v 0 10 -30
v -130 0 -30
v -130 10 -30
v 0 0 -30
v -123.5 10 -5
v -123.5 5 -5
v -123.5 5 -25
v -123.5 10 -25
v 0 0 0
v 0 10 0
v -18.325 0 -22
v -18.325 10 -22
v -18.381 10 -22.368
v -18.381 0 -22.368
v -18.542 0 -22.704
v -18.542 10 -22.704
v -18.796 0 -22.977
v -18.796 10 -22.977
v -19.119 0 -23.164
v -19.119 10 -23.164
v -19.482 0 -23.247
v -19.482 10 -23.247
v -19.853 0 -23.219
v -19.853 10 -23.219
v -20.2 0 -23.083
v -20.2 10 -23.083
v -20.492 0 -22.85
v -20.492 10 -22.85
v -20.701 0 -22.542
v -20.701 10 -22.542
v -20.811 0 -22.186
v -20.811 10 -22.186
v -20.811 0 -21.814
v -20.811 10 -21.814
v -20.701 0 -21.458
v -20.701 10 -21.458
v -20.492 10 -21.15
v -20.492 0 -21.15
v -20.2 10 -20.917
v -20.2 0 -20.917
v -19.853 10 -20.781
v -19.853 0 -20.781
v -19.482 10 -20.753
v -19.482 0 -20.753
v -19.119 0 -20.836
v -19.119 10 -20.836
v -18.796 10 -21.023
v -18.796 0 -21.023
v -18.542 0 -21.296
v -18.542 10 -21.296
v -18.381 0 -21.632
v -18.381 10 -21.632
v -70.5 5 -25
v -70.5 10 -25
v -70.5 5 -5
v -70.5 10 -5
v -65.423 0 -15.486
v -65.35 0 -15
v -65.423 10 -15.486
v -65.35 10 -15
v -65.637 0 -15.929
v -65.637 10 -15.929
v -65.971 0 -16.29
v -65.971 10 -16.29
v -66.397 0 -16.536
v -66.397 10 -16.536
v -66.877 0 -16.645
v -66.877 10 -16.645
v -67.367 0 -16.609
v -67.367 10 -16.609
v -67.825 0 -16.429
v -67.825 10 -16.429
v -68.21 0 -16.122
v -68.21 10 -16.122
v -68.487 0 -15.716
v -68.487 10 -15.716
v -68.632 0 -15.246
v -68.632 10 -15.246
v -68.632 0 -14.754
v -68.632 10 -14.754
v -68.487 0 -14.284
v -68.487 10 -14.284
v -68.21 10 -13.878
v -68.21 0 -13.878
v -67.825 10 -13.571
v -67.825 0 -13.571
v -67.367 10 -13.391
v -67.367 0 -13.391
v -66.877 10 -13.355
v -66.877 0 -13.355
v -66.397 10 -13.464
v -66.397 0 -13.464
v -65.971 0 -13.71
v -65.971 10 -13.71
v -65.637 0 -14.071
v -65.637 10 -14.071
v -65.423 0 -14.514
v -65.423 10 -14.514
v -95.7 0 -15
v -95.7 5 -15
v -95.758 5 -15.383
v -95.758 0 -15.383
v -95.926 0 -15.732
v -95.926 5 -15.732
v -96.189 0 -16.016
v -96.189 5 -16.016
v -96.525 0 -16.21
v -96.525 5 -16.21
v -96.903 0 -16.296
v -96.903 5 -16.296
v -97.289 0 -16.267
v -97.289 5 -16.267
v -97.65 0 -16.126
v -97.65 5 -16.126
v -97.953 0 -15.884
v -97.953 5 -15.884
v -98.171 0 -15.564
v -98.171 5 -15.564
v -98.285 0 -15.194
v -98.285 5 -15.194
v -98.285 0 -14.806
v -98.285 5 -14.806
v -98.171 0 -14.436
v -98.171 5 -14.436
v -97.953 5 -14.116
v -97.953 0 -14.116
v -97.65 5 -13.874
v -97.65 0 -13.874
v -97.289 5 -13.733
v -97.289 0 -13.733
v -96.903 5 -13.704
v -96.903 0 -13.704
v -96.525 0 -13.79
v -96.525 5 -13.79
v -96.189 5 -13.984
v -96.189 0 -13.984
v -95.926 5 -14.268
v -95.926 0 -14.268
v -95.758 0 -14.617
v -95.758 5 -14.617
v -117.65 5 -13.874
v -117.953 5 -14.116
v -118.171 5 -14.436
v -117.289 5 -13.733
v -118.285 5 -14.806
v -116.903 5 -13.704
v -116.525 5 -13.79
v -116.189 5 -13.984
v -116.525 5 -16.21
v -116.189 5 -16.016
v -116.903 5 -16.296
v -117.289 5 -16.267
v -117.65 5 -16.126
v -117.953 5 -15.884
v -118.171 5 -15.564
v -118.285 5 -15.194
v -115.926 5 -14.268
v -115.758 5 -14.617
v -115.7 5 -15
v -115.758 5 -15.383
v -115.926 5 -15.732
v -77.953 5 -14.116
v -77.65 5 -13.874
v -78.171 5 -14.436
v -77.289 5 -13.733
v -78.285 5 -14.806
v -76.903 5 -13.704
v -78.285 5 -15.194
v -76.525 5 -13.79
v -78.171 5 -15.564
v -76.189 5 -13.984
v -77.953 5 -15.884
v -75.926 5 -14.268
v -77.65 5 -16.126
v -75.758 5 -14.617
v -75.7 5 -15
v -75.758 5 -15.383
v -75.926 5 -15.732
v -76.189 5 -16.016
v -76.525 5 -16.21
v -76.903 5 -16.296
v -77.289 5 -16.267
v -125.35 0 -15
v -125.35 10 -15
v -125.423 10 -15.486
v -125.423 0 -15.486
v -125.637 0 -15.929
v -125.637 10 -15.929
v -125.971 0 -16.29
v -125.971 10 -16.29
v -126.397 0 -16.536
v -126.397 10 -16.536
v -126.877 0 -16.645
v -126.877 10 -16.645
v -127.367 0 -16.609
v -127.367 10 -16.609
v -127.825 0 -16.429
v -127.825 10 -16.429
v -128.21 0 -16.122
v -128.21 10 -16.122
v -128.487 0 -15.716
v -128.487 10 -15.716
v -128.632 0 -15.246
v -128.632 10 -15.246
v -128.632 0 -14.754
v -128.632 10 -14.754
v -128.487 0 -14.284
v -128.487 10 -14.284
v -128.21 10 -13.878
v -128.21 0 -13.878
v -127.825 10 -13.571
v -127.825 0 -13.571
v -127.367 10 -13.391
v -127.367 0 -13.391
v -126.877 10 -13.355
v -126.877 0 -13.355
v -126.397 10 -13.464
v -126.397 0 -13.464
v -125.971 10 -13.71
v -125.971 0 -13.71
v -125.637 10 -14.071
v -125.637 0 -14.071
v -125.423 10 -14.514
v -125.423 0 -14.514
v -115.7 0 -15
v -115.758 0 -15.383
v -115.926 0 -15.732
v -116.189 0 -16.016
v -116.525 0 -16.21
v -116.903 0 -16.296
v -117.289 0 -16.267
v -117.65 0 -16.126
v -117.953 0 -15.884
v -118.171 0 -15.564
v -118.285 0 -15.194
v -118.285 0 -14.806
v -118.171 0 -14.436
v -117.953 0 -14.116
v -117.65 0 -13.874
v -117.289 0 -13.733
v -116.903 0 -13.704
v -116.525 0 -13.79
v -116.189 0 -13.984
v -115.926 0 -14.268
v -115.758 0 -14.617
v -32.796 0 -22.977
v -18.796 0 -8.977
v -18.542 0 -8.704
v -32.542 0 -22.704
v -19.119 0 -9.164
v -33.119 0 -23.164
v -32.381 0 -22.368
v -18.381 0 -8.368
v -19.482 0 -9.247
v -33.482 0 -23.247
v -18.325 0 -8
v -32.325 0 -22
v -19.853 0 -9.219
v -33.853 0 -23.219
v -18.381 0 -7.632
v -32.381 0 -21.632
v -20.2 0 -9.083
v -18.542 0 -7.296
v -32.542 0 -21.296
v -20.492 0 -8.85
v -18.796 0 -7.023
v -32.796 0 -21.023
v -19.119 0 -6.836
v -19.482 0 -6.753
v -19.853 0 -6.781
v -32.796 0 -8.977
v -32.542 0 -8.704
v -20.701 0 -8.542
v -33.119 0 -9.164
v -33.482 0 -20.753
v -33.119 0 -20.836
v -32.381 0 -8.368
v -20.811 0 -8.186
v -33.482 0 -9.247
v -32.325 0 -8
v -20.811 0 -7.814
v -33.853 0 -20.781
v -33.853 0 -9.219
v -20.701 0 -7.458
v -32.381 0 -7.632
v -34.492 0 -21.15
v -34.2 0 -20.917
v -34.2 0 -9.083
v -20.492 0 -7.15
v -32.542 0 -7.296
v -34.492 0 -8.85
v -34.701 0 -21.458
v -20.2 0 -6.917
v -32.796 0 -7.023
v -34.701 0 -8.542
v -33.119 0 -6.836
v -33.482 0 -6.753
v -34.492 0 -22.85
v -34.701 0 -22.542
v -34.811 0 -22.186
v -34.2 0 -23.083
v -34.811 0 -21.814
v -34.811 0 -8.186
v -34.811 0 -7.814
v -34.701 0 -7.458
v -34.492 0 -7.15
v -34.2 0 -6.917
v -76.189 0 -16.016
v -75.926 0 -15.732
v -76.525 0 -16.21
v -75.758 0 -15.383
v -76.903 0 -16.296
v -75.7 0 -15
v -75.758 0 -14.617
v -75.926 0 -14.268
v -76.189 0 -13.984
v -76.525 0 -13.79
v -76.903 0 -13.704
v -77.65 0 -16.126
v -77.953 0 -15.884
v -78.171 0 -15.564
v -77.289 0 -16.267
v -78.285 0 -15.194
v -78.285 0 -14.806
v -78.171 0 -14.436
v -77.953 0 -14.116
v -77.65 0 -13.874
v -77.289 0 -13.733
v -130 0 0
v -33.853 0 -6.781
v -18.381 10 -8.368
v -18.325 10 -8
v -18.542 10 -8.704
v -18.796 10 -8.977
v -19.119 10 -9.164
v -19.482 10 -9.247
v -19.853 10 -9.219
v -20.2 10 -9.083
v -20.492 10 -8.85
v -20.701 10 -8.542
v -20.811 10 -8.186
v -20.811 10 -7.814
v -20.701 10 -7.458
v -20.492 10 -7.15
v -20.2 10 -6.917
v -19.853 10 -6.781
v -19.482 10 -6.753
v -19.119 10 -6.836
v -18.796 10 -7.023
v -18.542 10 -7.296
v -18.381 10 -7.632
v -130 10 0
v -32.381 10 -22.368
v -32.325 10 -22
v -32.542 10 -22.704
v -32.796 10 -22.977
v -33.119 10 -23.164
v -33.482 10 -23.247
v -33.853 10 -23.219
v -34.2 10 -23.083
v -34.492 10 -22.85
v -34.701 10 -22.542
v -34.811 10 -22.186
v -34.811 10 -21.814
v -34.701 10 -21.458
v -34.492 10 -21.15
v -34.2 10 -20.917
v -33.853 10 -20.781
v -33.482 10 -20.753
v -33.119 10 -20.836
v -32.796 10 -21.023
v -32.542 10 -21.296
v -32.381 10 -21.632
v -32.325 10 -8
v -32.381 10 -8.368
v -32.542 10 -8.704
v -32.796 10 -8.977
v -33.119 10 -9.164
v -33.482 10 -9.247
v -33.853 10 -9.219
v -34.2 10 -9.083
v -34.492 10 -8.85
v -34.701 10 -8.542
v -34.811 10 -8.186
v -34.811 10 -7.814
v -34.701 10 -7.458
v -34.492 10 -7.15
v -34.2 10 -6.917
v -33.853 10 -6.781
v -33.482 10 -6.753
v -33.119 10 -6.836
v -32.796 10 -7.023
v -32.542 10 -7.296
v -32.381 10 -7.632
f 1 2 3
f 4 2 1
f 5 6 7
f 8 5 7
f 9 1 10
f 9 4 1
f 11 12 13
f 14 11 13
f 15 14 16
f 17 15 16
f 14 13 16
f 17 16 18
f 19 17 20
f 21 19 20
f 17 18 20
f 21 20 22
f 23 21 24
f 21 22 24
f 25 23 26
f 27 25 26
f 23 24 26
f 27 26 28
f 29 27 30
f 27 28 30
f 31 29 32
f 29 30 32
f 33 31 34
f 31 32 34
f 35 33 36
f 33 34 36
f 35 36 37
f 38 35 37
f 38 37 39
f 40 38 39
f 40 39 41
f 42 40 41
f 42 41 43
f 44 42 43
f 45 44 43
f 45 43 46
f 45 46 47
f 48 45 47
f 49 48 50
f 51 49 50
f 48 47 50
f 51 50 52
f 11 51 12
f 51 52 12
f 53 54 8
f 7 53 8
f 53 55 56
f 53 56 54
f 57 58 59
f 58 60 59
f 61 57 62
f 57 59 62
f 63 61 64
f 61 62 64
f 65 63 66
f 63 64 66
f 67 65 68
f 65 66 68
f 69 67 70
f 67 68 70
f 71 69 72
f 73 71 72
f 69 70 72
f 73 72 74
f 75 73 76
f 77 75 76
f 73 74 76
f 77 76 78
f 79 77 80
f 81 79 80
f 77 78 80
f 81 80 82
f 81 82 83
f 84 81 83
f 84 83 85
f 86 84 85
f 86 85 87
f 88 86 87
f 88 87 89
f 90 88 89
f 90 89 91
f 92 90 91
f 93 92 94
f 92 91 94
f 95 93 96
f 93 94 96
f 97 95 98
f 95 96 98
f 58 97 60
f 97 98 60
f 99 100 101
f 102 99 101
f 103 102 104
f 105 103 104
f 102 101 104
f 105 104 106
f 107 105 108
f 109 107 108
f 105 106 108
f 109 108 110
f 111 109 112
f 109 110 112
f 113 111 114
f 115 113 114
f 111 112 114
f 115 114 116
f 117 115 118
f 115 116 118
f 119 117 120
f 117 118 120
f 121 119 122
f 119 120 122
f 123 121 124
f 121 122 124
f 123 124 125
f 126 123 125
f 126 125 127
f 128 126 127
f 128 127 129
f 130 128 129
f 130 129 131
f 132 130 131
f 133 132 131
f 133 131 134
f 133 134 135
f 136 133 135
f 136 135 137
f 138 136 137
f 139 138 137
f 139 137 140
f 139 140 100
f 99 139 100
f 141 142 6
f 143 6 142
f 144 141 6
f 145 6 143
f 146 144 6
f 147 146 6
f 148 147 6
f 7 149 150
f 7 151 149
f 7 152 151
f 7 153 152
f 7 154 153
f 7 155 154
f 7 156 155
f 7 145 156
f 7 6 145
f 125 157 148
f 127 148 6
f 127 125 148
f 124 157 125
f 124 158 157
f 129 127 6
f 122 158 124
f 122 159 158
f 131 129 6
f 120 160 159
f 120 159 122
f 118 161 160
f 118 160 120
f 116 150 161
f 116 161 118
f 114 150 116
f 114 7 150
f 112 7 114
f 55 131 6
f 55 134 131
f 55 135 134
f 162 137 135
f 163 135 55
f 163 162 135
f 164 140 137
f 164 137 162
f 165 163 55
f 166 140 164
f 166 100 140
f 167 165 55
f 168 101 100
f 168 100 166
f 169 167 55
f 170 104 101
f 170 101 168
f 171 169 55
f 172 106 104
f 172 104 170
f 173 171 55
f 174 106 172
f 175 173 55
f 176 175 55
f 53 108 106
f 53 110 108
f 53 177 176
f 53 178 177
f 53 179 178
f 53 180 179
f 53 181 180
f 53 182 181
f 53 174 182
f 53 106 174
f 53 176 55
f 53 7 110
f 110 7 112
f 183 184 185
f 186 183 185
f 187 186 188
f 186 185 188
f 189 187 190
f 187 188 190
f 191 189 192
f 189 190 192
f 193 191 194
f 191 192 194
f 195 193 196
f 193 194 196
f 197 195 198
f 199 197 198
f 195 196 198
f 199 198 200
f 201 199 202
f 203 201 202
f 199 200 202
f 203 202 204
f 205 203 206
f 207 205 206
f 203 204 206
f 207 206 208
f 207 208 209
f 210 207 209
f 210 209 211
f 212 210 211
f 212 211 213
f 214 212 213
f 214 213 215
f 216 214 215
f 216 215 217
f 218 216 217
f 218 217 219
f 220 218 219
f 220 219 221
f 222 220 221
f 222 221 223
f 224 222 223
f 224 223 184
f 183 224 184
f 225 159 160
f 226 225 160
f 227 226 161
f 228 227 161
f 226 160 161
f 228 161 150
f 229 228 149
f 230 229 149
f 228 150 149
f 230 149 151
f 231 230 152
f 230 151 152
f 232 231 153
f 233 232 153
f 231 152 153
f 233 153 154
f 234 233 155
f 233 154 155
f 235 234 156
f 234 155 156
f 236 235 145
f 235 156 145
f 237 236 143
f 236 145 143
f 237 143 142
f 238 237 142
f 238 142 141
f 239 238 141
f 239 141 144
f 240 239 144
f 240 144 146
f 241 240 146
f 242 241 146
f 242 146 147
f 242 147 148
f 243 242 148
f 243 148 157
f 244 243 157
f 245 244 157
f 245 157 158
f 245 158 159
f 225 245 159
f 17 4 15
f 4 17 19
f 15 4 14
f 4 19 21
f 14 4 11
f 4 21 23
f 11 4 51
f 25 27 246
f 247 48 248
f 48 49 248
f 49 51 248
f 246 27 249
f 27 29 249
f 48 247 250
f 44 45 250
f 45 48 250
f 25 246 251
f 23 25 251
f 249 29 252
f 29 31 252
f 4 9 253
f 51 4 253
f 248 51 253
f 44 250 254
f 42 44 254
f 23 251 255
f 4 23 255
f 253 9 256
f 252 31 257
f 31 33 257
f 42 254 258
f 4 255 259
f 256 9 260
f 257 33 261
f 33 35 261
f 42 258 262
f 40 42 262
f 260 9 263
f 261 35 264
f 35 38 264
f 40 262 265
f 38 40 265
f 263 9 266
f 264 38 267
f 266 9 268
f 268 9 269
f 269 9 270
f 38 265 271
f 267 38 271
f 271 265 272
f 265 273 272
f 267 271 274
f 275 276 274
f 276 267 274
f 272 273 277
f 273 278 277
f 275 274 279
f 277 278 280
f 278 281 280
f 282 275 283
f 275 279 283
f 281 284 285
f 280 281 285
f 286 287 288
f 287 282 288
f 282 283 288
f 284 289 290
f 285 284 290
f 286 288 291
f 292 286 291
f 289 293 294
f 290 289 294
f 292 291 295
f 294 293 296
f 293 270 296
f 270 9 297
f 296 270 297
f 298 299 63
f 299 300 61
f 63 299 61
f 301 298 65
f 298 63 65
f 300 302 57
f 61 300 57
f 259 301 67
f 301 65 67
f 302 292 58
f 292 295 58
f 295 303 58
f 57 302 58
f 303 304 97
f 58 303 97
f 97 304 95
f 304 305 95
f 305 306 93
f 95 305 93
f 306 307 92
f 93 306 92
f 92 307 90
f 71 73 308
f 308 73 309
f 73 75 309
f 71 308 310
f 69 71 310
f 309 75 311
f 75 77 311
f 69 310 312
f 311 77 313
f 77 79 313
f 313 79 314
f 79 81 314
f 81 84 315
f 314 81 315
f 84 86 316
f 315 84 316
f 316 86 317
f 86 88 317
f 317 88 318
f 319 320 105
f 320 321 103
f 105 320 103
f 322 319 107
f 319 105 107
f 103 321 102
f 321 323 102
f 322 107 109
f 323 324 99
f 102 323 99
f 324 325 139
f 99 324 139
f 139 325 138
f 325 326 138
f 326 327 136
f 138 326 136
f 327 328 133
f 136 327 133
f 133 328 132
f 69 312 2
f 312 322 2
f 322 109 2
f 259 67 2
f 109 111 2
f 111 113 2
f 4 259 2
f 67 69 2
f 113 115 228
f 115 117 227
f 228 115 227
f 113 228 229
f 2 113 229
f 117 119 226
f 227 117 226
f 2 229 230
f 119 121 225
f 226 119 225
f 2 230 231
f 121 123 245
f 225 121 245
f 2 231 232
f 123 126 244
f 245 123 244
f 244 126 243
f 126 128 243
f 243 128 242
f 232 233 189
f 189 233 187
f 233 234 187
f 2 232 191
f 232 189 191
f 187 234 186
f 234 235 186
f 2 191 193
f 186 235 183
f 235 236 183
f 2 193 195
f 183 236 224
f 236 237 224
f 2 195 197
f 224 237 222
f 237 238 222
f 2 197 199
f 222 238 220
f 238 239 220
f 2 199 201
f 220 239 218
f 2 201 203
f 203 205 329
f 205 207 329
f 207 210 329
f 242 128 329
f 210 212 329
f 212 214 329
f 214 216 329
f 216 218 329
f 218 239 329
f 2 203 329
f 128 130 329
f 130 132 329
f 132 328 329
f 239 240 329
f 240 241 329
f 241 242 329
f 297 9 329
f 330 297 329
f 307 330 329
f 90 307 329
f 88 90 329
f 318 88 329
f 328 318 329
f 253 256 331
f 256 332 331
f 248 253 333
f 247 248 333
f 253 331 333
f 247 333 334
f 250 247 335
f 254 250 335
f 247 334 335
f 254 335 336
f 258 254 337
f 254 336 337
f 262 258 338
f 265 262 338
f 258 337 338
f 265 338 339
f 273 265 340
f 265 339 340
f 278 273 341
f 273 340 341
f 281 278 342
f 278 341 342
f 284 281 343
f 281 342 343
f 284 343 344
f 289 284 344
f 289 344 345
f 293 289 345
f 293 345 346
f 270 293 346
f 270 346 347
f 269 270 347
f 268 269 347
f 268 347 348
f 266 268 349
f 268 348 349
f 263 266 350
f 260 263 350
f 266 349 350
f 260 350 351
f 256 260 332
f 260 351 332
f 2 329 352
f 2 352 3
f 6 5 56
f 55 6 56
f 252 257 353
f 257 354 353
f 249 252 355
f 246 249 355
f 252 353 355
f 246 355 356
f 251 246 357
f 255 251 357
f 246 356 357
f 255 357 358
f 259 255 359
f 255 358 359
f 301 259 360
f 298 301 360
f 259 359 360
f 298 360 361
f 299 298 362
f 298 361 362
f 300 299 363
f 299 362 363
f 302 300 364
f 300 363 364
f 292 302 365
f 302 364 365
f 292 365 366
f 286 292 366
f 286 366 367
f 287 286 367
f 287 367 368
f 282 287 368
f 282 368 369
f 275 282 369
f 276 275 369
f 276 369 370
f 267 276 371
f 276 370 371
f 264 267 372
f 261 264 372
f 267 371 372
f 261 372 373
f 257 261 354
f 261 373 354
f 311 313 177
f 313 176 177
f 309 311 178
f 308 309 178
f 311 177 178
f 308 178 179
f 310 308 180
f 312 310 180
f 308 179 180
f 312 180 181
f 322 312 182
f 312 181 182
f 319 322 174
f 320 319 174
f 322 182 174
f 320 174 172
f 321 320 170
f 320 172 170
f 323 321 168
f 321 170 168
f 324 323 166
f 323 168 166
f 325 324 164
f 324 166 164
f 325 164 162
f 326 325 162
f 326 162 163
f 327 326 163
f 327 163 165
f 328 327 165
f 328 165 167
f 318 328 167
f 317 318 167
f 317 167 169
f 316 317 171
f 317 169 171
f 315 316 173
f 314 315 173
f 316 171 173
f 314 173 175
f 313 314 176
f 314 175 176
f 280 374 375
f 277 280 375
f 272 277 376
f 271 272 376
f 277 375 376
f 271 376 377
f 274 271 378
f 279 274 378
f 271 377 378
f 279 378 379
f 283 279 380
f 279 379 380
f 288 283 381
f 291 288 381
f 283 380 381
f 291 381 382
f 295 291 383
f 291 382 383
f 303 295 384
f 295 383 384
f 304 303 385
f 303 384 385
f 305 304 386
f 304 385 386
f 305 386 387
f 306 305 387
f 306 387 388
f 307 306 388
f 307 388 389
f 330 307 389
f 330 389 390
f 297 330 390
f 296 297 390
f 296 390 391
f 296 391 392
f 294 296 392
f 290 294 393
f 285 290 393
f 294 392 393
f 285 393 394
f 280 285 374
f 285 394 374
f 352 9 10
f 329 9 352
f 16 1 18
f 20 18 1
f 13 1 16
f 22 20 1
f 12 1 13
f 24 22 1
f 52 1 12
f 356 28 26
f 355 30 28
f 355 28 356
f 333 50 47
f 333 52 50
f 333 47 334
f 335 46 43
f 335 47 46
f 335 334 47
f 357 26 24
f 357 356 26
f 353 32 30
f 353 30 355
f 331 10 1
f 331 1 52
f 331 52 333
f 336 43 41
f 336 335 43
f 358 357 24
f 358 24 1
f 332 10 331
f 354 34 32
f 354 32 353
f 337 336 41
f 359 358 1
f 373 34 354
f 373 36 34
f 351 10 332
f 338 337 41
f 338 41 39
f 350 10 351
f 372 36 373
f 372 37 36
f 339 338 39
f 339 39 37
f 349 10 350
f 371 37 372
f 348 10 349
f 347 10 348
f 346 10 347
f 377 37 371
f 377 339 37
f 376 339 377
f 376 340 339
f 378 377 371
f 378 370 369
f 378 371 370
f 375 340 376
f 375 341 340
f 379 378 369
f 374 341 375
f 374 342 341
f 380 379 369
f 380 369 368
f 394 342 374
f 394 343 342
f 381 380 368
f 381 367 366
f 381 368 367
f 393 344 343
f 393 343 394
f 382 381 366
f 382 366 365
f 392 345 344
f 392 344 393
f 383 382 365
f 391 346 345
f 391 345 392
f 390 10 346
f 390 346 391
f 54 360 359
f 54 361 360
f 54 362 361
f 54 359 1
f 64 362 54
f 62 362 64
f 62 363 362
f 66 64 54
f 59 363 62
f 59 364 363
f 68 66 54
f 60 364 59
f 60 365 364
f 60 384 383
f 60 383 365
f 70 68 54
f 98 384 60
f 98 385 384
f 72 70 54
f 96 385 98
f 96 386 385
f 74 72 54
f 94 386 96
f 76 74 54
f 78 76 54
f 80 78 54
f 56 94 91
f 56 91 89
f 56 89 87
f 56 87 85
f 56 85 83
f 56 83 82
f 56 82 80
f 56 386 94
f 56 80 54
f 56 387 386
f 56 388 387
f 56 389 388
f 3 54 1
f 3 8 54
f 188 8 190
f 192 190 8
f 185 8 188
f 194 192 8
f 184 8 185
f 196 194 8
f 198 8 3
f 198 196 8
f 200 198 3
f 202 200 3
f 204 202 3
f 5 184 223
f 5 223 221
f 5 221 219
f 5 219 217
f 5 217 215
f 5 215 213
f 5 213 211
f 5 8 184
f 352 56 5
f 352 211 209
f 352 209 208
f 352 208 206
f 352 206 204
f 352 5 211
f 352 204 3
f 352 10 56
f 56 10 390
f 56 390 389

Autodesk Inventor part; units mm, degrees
ref_plane "YZ Plane" through (0, 0, 0) normal (1, 0, 0) x (0, 1, 0)
ref_plane "XZ Plane" through (0, 0, 0) normal (0, 1, 0) x (-1, 0, 0)
ref_plane "XY Plane" through (0, 0, 0) normal (0, 0, 1) x (1, 0, 0)
sketch "Schizzo1" plane through (0, 0, 0) normal (0, 1, 0) x (-1, 0, 0)
  line L0 (0, 0) -> (130, 0)
  line L1 (130, 0) -> (130, -30)
  line L2 (130, -30) -> (0, -30)
  line L3 (0, -30) -> (0, 0)
  dimension "d0" = 30
  dimension "d1" = 130
extrude "Estrusione1" add sketch "Schizzo1" along normal blind 10
sketch "Schizzo2" plane through (0, 10, 0) normal (0, 1, 0) x (1, 0, 0)
  line L0 (-185.4023, 5) -> (-60, 5)
  line L1 (-60, 5) -> (-60, 25)
  line L2 (-60, 25) -> (-185.4023, 25)
  line L3 (-185.4023, 25) -> (-185.4023, 5)
  line L4 (-130, 0) -> (0, 0) projected
  line L5 (-130, 30) -> (-130, 0) projected
  point P0 (-130, 25)
  point P1 (-130, 5)
  dimension "d4" = 20
  dimension "d5" = 5
  dimension "d6" = 70
extrude "Estrusione2" cut sketch "Schizzo2" against normal blind 5 contours L5 L2 L1 L0
sketch "Schizzo3" plane through (0, 5, 0) normal (0, 1, 0) x (1, 0, 0)
  circle A0 centre (-127, 15) radius 1.65
  circle A1 centre (-117, 15) radius 1.3
  circle A2 centre (-97, 15) radius 1.3
  circle A3 centre (-77, 15) radius 1.3
  circle A4 centre (-67, 15) radius 1.65
  line L0 (-130, 0) -> (0, 0) projected
  line L1 (-130, 5) -> (-130, 25) projected
  line L2 (-145.516, 5) -> (-124, 5)
  line L3 (-124, 5) -> (-124, 25)
  line L4 (-124, 25) -> (-145.516, 25)
  line L5 (-145.516, 25) -> (-145.516, 5)
  line L6 (-60, 5) -> (-130, 5) projected
  line L7 (-70, 5) -> (-43.6658, 5)
  line L8 (-43.6658, 5) -> (-43.6658, 25)
  line L9 (-43.6658, 25) -> (-70, 25)
  line L10 (-70, 25) -> (-70, 5)
  dimension "d9" = 3.3
  dimension "d10" = 2.6
  dimension "d11" = 2.6
  dimension "d12" = 2.6
  dimension "d13" = 3.3
  dimension "d14" = 15
  dimension "d15" = 63
  dimension "d16" = 60
  dimension "d18" = 10
  dimension "d19" = 0
  dimension "d20" = 0
  dimension "d21" = 0
  dimension "d22" = 40
  dimension "d23" = 20
  dimension "d39" = 6
  dimension "d40" = 0
  dimension "d41" = 20
  dimension "d42" = 0
  dimension "d43" = 20
  dimension "d44" = 54
extrude "Estrusione3" cut sketch "Schizzo3" along normal through all both and the other way through all contours A0 | A1 | A2 | A3 | A4
sketch "Schizzo4" plane through (0, 10, 0) normal (0, 1, 0) x (1, 0, 0)
  circle A0 centre (-33.5752, 8) radius 1.25
  circle A1 centre (-19.5752, 8) radius 1.25
  circle A2 centre (-19.5752, 22) radius 1.25
  circle A3 centre (-33.5752, 22) radius 1.25
  line L0 (-130, 0) -> (0, 0) projected
  dimension "d26" = 14
  dimension "d27" = 14
  dimension "d28" = 14
  dimension "d29" = 14
  dimension "d30" = 0
  dimension "d31" = 0
  dimension "d32" = 8
  dimension "d33" = 2.5
  dimension "d34" = 2.5
  dimension "d35" = 2.5
  dimension "d36" = 2.5
extrude "Estrusione4" cut sketch "Schizzo4" against normal through all
sketch "Schizzo5" plane through (0, 5, 0) normal (0, 1, 0) x (1, 0, 0)
  line L0 (-60, 5) -> (-130, 5) projected
  line L1 (-130, 25) -> (-60, 25) projected
  line L2 (-60, 5) -> (-70.5, 5)
  line L3 (-70.5, 5) -> (-70.5, 25)
  line L4 (-70.5, 25) -> (-60, 25)
  line L5 (-60, 25) -> (-60, 5)
  line L6 (-130, 30) -> (-130, 0) projected
  line L7 (-130, 5) -> (-123.5, 5)
  line L8 (-123.5, 5) -> (-123.5, 25)
  line L9 (-123.5, 25) -> (-130, 25)
  line L10 (-130, 25) -> (-130, 5)
  point P0 (0, 0)
  point P1 (-123.5, 5)
  point P2 (-123.5, 25)
  dimension "d45" = 6.5
  dimension "d46" = 53
extrude "Estrusione5" add sketch "Schizzo5" along normal blind 5 contours L0 L3 L1 L5 | L0 L6 L1 L8
sketch "Schizzo6" plane through (0, 0, 0) normal (0, -1, 0) x (1, 0, 0)
  circle A0 centre (-127, -15) radius 1.65 projected
  circle A1 centre (-127, -15) radius 1.65
  circle A2 centre (-67, -15) radius 1.65 projected
  circle A3 centre (-67, -15) radius 1.65
  point P0 (0, 0)
  dimension "d49" = 3.3
  dimension "d50" = 3.3
extrude "Estrusione6" cut sketch "Schizzo6" against normal blind 50
properties part number "prortezione penna correnti parassite"
